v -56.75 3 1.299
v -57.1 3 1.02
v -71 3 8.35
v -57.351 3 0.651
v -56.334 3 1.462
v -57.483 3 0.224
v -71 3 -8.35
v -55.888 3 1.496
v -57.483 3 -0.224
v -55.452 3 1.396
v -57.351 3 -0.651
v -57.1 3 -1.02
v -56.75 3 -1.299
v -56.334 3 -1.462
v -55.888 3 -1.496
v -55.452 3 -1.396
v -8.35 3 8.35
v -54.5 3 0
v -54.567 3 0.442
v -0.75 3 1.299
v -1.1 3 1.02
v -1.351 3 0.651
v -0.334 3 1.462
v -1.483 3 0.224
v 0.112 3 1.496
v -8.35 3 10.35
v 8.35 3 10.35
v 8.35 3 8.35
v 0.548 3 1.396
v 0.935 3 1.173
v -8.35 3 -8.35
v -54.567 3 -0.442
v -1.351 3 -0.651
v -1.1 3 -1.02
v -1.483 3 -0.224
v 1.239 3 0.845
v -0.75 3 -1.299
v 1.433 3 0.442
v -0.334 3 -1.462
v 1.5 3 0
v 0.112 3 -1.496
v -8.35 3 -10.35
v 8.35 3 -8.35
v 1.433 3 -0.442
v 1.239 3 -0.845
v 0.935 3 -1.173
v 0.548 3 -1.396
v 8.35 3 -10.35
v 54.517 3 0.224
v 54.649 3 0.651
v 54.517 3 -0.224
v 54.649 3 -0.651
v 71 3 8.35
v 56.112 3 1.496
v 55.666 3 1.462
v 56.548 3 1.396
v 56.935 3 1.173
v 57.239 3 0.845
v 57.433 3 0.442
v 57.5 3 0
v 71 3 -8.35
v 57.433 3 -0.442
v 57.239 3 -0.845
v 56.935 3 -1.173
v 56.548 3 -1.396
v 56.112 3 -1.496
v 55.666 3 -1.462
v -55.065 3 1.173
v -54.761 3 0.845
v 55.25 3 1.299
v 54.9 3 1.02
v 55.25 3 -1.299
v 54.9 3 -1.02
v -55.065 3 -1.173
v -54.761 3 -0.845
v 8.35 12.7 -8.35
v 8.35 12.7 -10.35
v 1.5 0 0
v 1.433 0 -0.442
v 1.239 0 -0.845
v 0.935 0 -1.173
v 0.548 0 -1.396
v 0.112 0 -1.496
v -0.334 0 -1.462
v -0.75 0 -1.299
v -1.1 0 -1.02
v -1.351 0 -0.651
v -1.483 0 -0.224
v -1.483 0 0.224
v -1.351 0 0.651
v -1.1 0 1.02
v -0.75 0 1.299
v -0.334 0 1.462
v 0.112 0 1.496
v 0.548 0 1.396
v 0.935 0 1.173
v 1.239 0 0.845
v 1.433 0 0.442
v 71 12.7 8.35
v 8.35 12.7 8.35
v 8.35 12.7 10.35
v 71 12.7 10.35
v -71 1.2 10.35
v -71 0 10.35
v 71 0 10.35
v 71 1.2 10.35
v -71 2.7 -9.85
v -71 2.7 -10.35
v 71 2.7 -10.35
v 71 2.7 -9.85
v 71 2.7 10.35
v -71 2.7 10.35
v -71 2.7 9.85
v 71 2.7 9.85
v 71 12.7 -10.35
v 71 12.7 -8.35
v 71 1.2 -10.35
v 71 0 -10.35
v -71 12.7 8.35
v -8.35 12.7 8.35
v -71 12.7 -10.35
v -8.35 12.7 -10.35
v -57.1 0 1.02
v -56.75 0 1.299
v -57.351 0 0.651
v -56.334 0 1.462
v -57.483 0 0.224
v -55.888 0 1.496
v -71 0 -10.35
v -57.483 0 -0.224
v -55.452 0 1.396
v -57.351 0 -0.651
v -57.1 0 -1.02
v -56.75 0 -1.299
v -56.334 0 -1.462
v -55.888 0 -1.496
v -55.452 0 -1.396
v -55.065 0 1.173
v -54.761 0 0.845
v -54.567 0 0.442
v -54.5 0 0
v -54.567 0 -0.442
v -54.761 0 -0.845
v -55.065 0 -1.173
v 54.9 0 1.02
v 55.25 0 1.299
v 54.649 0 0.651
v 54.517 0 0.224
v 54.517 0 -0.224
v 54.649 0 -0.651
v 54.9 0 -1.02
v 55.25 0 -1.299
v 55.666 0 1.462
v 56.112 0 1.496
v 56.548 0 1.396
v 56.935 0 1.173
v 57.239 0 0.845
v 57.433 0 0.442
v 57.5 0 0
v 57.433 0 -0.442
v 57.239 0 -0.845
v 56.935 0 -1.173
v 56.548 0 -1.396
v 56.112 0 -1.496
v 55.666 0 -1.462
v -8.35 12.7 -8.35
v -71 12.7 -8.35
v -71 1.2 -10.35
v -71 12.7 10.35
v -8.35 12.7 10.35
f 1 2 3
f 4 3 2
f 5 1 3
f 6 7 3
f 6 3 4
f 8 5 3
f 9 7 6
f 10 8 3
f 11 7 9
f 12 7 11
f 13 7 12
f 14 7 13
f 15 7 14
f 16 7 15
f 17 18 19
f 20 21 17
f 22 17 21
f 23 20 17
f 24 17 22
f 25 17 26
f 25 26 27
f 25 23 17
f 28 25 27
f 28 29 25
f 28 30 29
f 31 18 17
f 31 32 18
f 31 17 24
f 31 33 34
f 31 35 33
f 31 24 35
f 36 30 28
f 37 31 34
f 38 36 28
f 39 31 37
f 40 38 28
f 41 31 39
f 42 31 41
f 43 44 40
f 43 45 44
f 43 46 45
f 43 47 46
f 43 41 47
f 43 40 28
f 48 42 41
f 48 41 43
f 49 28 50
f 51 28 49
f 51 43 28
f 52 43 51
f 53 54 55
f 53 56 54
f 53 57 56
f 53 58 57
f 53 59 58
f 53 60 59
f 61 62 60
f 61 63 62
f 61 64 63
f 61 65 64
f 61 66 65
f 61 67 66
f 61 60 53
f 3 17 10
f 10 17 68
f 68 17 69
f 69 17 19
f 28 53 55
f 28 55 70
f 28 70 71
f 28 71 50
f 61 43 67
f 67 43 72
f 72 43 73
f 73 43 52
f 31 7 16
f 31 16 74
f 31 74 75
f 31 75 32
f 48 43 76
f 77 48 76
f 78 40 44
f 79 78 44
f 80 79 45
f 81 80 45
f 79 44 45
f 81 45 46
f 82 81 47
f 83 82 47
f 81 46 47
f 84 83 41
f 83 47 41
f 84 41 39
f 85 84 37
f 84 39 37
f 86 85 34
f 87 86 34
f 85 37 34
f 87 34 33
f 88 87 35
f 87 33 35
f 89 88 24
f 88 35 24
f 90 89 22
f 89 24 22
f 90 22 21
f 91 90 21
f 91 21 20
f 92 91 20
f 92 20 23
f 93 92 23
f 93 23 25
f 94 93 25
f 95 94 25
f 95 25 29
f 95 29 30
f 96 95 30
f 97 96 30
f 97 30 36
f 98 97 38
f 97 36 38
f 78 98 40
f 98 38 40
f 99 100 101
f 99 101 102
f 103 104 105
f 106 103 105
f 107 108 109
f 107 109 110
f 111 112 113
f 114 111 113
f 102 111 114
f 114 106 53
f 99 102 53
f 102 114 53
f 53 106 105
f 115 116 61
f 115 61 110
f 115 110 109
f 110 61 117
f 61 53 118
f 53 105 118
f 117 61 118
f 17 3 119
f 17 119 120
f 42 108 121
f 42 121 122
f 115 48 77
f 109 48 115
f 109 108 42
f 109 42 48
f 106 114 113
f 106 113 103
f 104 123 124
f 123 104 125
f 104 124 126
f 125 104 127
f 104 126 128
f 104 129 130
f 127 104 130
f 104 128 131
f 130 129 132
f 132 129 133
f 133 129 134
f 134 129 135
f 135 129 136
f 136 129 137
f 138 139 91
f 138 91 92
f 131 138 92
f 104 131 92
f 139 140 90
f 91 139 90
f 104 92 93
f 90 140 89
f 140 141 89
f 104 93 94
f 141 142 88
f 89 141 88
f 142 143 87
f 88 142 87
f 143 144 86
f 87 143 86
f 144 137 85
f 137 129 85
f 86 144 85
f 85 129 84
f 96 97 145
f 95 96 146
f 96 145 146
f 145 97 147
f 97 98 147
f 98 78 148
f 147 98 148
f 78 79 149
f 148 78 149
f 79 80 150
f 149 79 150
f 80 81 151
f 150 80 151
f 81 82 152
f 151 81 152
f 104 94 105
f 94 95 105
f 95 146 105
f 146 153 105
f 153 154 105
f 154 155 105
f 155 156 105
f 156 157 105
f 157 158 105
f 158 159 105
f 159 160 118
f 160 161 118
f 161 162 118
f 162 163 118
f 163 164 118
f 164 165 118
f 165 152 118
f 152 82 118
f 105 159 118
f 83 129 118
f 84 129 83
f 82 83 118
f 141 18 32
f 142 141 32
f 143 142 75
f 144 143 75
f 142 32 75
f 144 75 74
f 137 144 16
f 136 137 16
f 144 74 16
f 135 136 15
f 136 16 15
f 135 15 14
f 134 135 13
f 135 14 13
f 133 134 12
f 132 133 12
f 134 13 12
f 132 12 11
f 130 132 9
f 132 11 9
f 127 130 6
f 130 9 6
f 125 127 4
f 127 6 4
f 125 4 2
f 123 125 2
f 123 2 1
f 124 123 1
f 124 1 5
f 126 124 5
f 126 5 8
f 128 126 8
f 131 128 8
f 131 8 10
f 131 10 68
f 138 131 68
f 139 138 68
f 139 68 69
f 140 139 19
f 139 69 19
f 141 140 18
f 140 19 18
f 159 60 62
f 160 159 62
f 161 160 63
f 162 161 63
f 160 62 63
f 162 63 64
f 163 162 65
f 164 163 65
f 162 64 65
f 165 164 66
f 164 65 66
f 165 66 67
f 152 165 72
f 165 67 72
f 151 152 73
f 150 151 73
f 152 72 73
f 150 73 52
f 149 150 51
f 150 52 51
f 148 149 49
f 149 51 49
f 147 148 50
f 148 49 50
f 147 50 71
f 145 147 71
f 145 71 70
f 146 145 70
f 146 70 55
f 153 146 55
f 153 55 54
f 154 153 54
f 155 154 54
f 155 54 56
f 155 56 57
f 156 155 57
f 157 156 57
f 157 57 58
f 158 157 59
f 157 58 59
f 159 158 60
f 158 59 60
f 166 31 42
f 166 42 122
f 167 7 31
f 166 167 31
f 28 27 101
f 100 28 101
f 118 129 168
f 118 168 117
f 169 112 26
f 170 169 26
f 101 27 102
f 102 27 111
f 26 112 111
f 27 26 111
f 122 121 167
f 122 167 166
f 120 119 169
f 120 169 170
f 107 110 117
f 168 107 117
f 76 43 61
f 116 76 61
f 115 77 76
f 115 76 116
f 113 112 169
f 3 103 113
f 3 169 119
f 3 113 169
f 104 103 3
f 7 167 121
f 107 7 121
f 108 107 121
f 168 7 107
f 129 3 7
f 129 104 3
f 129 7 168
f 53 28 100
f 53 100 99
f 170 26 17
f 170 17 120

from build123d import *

# Parameters (mm, degrees)
CROQUIS1_W              = 142
CROQUIS1_H              = 20.7
SALIENTE_EXTRUIR2_DEPTH = 3
CROQUIS6_R              = 1.5
CORTAR_EXTRUIR4_DEPTH   = 3
CROQUIS7_W              = 142
CROQUIS7_H              = 2
SALIENTE_EXTRUIR3_DEPTH = 9.7
CORTAR_EXTRUIR5_DEPTH   = 224
CROQUIS10_W             = 16.7
CROQUIS10_H             = 9.7
CORTAR_EXTRUIR6_DEPTH   = 80


with BuildPart() as part:
    # Croquis1 → Saliente-Extruir2 (new body)
    with BuildSketch(Plane(origin=(0, 0, 0), x_dir=(1, 0, 0), z_dir=(0, 1, 0))):
        Rectangle(CROQUIS1_W, CROQUIS1_H)
    extrude(amount=SALIENTE_EXTRUIR2_DEPTH)

    # Croquis6 → Cortar-Extruir4 (cut)
    with BuildSketch(Plane(origin=(0, 3, 0), x_dir=(1, 0, 0), z_dir=(0, 1, 0))):
        with Locations((-56, 0)):
            Circle(CROQUIS6_R)
        Circle(CROQUIS6_R)
        with Locations((56, 0)):
            Circle(CROQUIS6_R)
    extrude(amount=-CORTAR_EXTRUIR4_DEPTH, mode=Mode.SUBTRACT)

    # Croquis7 → Saliente-Extruir3 (add)
    with BuildSketch(Plane(origin=(0, 3, 0), x_dir=(1, 0, 0), z_dir=(0, 1, 0))):
        with Locations((0, 9.35)):
            Rectangle(CROQUIS7_W, CROQUIS7_H)
        with Locations((0, -9.35)):
            Rectangle(CROQUIS7_W, CROQUIS7_H)
    extrude(amount=SALIENTE_EXTRUIR3_DEPTH)

    # Croquis9 → Cortar-Extruir5 (cut)
    with BuildSketch(Plane.ZY.offset(71)):
        Polygon((-10.35, 2.7), (-9.85, 2.7), (-10.35, 1.2), align=None)
        Polygon((10.35, 2.7), (9.85, 2.7), (10.35, 1.2), align=None)
    extrude(amount=-CORTAR_EXTRUIR5_DEPTH, mode=Mode.SUBTRACT)

    # Croquis10 → Cortar-Extruir6 (cut)
    with BuildSketch(Plane.XY.offset(10.35)):
        with Locations((0, 7.85)):
            Rectangle(CROQUIS10_W, CROQUIS10_H)
    extrude(amount=-CORTAR_EXTRUIR6_DEPTH, mode=Mode.SUBTRACT)


solid = part.part
